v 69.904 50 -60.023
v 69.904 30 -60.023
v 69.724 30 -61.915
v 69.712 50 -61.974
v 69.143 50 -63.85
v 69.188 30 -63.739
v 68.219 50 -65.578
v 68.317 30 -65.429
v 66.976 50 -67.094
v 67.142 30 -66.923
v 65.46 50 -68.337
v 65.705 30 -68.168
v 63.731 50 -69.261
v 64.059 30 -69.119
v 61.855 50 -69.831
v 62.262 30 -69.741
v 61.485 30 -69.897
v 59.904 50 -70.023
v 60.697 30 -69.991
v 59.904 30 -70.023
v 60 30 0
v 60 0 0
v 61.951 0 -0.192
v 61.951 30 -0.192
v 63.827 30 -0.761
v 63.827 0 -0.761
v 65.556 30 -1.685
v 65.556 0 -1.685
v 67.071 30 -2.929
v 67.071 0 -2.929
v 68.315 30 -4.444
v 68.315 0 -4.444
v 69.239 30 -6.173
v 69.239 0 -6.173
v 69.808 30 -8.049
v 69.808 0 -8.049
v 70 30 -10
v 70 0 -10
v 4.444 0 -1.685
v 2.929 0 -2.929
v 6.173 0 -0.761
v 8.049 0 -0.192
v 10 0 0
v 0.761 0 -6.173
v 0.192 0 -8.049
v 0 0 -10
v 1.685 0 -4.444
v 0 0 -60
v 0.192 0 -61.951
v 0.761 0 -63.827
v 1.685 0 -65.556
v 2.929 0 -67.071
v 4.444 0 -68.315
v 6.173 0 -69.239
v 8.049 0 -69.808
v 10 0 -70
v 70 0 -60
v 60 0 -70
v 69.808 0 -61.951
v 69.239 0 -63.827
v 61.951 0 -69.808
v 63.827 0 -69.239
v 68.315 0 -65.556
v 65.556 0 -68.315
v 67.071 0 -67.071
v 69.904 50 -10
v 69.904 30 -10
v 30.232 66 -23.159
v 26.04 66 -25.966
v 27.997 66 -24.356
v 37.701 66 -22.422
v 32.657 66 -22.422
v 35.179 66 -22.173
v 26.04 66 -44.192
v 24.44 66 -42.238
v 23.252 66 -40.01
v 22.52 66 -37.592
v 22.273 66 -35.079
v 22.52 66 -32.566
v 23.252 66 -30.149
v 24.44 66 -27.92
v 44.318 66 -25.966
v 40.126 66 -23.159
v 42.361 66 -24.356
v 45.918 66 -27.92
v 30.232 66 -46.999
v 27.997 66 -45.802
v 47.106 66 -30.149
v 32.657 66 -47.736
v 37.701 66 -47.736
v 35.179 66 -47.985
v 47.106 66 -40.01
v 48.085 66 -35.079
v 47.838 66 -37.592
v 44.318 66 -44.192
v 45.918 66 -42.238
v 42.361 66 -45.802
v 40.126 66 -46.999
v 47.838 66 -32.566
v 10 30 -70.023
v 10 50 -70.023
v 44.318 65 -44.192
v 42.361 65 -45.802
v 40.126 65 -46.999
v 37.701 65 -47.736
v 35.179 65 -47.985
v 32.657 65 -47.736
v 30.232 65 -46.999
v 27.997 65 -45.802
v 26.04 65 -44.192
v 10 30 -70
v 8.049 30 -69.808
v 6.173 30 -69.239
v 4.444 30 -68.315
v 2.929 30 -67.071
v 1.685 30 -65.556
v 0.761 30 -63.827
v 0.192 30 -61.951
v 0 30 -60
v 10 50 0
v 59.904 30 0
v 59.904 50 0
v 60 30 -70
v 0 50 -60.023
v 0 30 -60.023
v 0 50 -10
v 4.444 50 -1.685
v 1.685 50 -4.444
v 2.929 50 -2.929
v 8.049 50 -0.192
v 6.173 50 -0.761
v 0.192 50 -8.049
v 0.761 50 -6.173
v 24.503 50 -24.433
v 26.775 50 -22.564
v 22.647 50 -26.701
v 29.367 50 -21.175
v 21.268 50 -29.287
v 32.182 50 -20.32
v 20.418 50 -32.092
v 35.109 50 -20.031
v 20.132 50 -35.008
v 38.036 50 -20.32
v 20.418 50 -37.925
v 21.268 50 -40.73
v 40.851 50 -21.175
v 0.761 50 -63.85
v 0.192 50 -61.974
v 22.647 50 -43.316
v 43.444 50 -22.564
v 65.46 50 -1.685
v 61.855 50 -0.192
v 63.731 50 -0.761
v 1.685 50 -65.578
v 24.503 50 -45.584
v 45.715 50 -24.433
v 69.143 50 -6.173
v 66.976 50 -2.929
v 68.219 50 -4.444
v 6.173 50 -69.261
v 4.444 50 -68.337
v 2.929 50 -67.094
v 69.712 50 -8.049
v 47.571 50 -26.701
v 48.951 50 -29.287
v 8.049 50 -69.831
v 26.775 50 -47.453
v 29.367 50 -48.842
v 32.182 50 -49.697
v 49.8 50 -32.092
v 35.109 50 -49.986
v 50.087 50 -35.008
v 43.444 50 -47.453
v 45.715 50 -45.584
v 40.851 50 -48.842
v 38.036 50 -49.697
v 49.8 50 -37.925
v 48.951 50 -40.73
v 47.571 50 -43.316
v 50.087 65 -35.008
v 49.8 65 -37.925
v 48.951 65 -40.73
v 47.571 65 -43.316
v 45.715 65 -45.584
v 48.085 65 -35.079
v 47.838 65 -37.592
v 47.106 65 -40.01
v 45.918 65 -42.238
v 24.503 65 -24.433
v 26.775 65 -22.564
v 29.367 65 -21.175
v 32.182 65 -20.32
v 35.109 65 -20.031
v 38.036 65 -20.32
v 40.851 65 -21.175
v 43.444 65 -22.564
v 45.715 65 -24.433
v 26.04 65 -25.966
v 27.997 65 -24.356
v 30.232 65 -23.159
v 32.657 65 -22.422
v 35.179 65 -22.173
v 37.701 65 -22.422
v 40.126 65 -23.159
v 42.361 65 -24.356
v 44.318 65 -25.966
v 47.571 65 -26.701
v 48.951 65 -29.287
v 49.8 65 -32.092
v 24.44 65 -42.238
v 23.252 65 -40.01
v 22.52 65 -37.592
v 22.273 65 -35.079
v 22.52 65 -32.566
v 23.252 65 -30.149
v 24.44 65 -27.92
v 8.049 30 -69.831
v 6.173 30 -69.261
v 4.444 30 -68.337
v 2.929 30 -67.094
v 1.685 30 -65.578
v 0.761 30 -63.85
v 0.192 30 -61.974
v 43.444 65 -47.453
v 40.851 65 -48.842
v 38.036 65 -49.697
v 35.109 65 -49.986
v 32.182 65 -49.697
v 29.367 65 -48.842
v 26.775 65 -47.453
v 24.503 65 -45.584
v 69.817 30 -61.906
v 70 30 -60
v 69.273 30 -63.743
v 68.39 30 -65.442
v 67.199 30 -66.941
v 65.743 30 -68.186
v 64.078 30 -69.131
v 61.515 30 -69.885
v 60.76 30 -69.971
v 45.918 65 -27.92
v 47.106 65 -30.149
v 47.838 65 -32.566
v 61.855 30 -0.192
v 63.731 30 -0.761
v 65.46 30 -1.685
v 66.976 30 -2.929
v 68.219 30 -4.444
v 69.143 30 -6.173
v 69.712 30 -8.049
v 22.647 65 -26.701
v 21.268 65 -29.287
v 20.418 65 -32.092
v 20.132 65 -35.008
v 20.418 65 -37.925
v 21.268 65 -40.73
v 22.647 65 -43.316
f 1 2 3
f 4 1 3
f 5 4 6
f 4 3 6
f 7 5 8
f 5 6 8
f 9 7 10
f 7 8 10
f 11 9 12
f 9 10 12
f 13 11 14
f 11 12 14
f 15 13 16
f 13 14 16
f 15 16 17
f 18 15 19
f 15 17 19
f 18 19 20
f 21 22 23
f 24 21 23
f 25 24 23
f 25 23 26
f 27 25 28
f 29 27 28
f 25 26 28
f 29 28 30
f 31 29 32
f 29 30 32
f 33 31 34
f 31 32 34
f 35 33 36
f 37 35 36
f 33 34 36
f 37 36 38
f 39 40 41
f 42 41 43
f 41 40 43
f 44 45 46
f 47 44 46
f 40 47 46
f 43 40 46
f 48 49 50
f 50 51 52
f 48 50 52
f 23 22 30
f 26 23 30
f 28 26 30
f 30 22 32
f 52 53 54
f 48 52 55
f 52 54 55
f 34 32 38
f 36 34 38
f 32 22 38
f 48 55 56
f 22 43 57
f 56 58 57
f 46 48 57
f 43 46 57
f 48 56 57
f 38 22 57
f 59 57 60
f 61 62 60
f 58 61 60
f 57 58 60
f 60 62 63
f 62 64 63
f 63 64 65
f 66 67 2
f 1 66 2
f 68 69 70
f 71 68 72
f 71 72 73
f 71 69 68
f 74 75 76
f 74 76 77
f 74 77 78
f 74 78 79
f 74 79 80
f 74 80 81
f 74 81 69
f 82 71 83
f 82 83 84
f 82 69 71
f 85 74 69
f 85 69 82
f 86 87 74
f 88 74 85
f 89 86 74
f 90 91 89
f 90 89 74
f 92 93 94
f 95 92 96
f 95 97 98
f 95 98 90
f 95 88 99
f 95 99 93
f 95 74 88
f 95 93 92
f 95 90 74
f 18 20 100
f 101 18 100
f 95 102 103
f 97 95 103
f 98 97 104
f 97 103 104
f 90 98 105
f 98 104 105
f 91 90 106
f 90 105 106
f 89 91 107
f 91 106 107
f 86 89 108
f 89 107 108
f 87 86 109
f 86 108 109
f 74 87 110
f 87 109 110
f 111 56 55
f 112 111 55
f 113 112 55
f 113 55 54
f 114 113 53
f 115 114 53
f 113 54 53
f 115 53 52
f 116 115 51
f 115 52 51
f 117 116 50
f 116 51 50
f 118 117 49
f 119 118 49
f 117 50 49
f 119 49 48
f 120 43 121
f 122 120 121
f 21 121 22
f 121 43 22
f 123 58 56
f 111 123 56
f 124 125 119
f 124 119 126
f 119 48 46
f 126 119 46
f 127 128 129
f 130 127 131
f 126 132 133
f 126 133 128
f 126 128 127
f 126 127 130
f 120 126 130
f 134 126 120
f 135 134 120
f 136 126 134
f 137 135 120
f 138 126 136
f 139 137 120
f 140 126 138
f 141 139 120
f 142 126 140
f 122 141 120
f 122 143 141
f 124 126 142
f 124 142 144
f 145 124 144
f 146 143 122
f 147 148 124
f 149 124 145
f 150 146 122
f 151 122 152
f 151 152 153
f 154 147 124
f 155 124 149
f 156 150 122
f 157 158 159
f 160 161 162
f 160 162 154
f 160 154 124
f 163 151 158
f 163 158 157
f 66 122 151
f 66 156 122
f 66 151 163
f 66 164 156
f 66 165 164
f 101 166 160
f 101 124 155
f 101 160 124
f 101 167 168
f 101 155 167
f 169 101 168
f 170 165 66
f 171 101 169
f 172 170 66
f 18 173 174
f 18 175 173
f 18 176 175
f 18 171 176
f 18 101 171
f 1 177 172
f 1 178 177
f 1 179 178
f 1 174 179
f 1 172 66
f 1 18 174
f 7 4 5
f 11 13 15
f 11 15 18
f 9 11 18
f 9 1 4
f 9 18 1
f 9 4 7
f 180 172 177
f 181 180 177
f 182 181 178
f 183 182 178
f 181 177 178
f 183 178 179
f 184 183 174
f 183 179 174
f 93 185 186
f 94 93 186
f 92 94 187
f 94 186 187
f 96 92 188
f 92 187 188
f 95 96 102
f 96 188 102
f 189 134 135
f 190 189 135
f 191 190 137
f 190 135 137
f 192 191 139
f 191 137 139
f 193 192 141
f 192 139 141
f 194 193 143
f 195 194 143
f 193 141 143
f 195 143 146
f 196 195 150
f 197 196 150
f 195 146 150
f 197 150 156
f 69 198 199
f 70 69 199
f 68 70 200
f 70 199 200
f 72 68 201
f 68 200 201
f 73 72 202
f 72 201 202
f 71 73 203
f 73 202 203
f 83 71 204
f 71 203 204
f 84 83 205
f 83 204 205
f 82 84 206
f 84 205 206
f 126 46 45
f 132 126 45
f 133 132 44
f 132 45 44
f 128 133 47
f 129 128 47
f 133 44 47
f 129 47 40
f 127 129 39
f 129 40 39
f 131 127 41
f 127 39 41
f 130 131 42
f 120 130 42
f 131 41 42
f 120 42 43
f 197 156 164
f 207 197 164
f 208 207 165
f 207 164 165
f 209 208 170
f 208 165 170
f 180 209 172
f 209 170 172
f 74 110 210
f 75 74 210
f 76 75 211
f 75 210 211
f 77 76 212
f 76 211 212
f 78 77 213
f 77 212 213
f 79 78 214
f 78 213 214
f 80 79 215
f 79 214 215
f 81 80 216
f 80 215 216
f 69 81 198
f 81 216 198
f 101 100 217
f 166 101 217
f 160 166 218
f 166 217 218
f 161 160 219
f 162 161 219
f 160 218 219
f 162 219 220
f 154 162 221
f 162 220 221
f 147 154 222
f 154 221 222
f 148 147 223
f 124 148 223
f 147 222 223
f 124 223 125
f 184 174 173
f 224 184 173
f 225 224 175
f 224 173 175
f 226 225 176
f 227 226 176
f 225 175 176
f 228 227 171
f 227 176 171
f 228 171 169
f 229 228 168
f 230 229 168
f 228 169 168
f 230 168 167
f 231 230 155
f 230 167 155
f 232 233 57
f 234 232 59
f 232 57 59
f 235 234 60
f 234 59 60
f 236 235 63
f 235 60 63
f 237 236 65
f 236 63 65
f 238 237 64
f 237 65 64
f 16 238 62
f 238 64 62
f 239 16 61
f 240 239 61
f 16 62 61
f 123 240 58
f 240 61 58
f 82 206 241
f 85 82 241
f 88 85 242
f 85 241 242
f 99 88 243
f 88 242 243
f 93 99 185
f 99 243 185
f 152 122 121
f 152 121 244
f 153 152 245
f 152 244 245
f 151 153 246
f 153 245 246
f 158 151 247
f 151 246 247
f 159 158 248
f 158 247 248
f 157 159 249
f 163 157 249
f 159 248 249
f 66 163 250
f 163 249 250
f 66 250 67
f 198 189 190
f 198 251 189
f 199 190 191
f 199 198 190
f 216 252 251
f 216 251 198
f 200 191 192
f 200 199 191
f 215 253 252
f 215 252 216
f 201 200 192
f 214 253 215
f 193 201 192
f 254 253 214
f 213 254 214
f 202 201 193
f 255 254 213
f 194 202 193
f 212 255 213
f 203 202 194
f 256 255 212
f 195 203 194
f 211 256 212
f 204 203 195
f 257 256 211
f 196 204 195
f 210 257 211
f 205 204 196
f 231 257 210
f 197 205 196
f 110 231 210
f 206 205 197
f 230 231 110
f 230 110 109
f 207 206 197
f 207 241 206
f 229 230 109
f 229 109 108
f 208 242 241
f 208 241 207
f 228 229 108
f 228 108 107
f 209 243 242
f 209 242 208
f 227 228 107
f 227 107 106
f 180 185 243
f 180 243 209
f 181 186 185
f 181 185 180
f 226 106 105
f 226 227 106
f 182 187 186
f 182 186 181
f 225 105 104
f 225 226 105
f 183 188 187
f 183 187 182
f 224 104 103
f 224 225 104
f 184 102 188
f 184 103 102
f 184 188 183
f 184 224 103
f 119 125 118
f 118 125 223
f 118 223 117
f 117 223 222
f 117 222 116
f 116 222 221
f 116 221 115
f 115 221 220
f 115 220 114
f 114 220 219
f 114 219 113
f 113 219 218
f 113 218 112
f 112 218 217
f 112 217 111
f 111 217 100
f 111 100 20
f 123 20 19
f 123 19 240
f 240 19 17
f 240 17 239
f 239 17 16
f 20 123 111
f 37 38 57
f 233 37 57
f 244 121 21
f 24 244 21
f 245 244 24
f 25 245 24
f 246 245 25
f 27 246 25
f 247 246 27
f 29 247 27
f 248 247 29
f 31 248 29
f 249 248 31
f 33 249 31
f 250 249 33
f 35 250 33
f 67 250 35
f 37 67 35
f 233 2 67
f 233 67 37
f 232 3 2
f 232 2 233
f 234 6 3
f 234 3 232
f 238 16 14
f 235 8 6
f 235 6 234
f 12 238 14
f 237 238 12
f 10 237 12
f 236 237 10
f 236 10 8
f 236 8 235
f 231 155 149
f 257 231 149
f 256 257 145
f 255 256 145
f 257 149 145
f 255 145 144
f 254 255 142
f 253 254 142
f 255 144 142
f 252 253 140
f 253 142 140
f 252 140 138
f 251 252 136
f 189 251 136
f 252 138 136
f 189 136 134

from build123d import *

# Parameters (mm, degrees)
SALIENTE_EXTRUIR1_DEPTH = 30
SALIENTE_EXTRUIR2_DEPTH = 20
SALIENTE_EXTRUIR3_DEPTH = 15
SALIENTE_EXTRUIR4_DEPTH = 1


with BuildPart() as part:
    # Croquis1 → Saliente-Extruir1 (new body)
    with BuildSketch(Plane(origin=(0, 0, 0), x_dir=(1, 0, 0), z_dir=(0, 1, 0))):
        with BuildLine():
            Line((10, 0), (60, 0))
            ThreePointArc((60, 0), (67.071067812, 2.928932188), (70, 10))
            Line((70, 10), (70, 60))
            ThreePointArc((70, 60), (67.071067812, 67.071067812), (60, 70))
            Line((60, 70), (10, 70))
            ThreePointArc((10, 70), (2.928932188, 67.071067812), (0, 60))
            Line((0, 60), (0, 10))
            ThreePointArc((0, 10), (2.928932188, 2.928932188), (10, 0))
        make_face()
    extrude(amount=SALIENTE_EXTRUIR1_DEPTH)

    # Croquis2 → Saliente-Extruir2 (add)
    with BuildSketch(Plane(origin=(0, 30, 0), x_dir=(1, 0, 0), z_dir=(0, 1, 0))):
        with BuildLine():
            Line((10, 0), (59.904487732, 0))
            ThreePointArc((59.904487732, 0), (66.975555544, 2.928932188), (69.904487732, 10))
            Line((69.904487732, 10), (69.904487732, 60.022676449))
            ThreePointArc((69.904487732, 60.022676449), (66.975555544, 67.093744261), (59.904487732, 70.022676449))
            Line((59.904487732, 70.022676449), (10, 70.022676449))
            ThreePointArc((10, 70.022676449), (2.928932188, 67.093744261), (0, 60.022676449))
            Line((0, 60.022676449), (0, 10))
            ThreePointArc((0, 10), (2.928932188, 2.928932188), (10, 0))
        make_face()
    extrude(amount=SALIENTE_EXTRUIR2_DEPTH)

    # Croquis3 → Saliente-Extruir3 (add)
    with BuildSketch(Plane(origin=(0, 50, 0), x_dir=(1, 0, 0), z_dir=(0, 1, 0))):
        with BuildLine():
            ThreePointArc((45.714988655, 45.583878221), (35.109068959, 49.985918595), (24.503149262, 45.583878221))
            Line((24.503149262, 45.583878221), (35.109068959, 35.008376267))
            Line((35.109068959, 35.008376267), (45.714988655, 45.583878221))
        make_face()
        with BuildLine():
            Line((35.109068959, 35.008376267), (24.503149262, 45.583878221))
            ThreePointArc((24.503149262, 45.583878221), (20.131526631, 35.008376267), (24.503149262, 24.432874313))
            Line((24.503149262, 24.432874313), (35.109068959, 35.008376267))
        make_face()
        with BuildLine():
            Line((45.714988655, 45.583878221), (35.109068959, 35.008376267))
            Line((35.109068959, 35.008376267), (45.714988655, 24.432874313))
            ThreePointArc((45.714988655, 24.432874313), (48.950625688, 29.286656114), (50.086611287, 35.008376267))
            ThreePointArc((50.086611287, 35.008376267), (48.950625688, 40.730096419), (45.714988655, 45.583878221))
        make_face()
        with BuildLine():
            Line((45.714988655, 24.432874313), (35.109068959, 35.008376267))
            Line((35.109068959, 35.008376267), (24.503149262, 24.432874313))
            ThreePointArc((24.503149262, 24.432874313), (35.109068959, 20.030833939), (45.714988655, 24.432874313))
        make_face()
    extrude(amount=SALIENTE_EXTRUIR3_DEPTH)

    # Croquis4 → Saliente-Extruir4 (add)
    with BuildSketch(Plane(origin=(0, 65, 0), x_dir=(1, 0, 0), z_dir=(0, 1, 0))):
        with BuildLine():
            ThreePointArc((26.040054757, 25.966127976), (35.178980063, 22.173048991), (44.317905369, 25.966127976))
            Line((44.317905369, 25.966127976), (35.178980063, 35.079108201))
            Line((35.178980063, 35.079108201), (26.040054757, 25.966127976))
        make_face()
        with BuildLine():
            Line((35.178980063, 35.079108201), (44.317905369, 25.966127976))
            ThreePointArc((44.317905369, 25.966127976), (47.106131346, 30.148649135), (48.085039273, 35.079108201))
            ThreePointArc((48.085039273, 35.079108201), (47.106131346, 40.009567268), (44.317905369, 44.192088426))
            Line((44.317905369, 44.192088426), (35.178980063, 35.079108201))
        make_face()
        with BuildLine():
            Line((26.040054757, 25.966127976), (35.178980063, 35.079108201))
            Line((35.178980063, 35.079108201), (26.040054757, 44.192088426))
            ThreePointArc((26.040054757, 44.192088426), (22.272920853, 35.079108201), (26.040054757, 25.966127976))
        make_face()
        with BuildLine():
            Line((26.040054757, 44.192088426), (35.178980063, 35.079108201))
            Line((35.178980063, 35.079108201), (44.317905369, 44.192088426))
            ThreePointArc((44.317905369, 44.192088426), (35.178980063, 47.985167411), (26.040054757, 44.192088426))
        make_face()
    extrude(amount=SALIENTE_EXTRUIR4_DEPTH)


solid = part.part
